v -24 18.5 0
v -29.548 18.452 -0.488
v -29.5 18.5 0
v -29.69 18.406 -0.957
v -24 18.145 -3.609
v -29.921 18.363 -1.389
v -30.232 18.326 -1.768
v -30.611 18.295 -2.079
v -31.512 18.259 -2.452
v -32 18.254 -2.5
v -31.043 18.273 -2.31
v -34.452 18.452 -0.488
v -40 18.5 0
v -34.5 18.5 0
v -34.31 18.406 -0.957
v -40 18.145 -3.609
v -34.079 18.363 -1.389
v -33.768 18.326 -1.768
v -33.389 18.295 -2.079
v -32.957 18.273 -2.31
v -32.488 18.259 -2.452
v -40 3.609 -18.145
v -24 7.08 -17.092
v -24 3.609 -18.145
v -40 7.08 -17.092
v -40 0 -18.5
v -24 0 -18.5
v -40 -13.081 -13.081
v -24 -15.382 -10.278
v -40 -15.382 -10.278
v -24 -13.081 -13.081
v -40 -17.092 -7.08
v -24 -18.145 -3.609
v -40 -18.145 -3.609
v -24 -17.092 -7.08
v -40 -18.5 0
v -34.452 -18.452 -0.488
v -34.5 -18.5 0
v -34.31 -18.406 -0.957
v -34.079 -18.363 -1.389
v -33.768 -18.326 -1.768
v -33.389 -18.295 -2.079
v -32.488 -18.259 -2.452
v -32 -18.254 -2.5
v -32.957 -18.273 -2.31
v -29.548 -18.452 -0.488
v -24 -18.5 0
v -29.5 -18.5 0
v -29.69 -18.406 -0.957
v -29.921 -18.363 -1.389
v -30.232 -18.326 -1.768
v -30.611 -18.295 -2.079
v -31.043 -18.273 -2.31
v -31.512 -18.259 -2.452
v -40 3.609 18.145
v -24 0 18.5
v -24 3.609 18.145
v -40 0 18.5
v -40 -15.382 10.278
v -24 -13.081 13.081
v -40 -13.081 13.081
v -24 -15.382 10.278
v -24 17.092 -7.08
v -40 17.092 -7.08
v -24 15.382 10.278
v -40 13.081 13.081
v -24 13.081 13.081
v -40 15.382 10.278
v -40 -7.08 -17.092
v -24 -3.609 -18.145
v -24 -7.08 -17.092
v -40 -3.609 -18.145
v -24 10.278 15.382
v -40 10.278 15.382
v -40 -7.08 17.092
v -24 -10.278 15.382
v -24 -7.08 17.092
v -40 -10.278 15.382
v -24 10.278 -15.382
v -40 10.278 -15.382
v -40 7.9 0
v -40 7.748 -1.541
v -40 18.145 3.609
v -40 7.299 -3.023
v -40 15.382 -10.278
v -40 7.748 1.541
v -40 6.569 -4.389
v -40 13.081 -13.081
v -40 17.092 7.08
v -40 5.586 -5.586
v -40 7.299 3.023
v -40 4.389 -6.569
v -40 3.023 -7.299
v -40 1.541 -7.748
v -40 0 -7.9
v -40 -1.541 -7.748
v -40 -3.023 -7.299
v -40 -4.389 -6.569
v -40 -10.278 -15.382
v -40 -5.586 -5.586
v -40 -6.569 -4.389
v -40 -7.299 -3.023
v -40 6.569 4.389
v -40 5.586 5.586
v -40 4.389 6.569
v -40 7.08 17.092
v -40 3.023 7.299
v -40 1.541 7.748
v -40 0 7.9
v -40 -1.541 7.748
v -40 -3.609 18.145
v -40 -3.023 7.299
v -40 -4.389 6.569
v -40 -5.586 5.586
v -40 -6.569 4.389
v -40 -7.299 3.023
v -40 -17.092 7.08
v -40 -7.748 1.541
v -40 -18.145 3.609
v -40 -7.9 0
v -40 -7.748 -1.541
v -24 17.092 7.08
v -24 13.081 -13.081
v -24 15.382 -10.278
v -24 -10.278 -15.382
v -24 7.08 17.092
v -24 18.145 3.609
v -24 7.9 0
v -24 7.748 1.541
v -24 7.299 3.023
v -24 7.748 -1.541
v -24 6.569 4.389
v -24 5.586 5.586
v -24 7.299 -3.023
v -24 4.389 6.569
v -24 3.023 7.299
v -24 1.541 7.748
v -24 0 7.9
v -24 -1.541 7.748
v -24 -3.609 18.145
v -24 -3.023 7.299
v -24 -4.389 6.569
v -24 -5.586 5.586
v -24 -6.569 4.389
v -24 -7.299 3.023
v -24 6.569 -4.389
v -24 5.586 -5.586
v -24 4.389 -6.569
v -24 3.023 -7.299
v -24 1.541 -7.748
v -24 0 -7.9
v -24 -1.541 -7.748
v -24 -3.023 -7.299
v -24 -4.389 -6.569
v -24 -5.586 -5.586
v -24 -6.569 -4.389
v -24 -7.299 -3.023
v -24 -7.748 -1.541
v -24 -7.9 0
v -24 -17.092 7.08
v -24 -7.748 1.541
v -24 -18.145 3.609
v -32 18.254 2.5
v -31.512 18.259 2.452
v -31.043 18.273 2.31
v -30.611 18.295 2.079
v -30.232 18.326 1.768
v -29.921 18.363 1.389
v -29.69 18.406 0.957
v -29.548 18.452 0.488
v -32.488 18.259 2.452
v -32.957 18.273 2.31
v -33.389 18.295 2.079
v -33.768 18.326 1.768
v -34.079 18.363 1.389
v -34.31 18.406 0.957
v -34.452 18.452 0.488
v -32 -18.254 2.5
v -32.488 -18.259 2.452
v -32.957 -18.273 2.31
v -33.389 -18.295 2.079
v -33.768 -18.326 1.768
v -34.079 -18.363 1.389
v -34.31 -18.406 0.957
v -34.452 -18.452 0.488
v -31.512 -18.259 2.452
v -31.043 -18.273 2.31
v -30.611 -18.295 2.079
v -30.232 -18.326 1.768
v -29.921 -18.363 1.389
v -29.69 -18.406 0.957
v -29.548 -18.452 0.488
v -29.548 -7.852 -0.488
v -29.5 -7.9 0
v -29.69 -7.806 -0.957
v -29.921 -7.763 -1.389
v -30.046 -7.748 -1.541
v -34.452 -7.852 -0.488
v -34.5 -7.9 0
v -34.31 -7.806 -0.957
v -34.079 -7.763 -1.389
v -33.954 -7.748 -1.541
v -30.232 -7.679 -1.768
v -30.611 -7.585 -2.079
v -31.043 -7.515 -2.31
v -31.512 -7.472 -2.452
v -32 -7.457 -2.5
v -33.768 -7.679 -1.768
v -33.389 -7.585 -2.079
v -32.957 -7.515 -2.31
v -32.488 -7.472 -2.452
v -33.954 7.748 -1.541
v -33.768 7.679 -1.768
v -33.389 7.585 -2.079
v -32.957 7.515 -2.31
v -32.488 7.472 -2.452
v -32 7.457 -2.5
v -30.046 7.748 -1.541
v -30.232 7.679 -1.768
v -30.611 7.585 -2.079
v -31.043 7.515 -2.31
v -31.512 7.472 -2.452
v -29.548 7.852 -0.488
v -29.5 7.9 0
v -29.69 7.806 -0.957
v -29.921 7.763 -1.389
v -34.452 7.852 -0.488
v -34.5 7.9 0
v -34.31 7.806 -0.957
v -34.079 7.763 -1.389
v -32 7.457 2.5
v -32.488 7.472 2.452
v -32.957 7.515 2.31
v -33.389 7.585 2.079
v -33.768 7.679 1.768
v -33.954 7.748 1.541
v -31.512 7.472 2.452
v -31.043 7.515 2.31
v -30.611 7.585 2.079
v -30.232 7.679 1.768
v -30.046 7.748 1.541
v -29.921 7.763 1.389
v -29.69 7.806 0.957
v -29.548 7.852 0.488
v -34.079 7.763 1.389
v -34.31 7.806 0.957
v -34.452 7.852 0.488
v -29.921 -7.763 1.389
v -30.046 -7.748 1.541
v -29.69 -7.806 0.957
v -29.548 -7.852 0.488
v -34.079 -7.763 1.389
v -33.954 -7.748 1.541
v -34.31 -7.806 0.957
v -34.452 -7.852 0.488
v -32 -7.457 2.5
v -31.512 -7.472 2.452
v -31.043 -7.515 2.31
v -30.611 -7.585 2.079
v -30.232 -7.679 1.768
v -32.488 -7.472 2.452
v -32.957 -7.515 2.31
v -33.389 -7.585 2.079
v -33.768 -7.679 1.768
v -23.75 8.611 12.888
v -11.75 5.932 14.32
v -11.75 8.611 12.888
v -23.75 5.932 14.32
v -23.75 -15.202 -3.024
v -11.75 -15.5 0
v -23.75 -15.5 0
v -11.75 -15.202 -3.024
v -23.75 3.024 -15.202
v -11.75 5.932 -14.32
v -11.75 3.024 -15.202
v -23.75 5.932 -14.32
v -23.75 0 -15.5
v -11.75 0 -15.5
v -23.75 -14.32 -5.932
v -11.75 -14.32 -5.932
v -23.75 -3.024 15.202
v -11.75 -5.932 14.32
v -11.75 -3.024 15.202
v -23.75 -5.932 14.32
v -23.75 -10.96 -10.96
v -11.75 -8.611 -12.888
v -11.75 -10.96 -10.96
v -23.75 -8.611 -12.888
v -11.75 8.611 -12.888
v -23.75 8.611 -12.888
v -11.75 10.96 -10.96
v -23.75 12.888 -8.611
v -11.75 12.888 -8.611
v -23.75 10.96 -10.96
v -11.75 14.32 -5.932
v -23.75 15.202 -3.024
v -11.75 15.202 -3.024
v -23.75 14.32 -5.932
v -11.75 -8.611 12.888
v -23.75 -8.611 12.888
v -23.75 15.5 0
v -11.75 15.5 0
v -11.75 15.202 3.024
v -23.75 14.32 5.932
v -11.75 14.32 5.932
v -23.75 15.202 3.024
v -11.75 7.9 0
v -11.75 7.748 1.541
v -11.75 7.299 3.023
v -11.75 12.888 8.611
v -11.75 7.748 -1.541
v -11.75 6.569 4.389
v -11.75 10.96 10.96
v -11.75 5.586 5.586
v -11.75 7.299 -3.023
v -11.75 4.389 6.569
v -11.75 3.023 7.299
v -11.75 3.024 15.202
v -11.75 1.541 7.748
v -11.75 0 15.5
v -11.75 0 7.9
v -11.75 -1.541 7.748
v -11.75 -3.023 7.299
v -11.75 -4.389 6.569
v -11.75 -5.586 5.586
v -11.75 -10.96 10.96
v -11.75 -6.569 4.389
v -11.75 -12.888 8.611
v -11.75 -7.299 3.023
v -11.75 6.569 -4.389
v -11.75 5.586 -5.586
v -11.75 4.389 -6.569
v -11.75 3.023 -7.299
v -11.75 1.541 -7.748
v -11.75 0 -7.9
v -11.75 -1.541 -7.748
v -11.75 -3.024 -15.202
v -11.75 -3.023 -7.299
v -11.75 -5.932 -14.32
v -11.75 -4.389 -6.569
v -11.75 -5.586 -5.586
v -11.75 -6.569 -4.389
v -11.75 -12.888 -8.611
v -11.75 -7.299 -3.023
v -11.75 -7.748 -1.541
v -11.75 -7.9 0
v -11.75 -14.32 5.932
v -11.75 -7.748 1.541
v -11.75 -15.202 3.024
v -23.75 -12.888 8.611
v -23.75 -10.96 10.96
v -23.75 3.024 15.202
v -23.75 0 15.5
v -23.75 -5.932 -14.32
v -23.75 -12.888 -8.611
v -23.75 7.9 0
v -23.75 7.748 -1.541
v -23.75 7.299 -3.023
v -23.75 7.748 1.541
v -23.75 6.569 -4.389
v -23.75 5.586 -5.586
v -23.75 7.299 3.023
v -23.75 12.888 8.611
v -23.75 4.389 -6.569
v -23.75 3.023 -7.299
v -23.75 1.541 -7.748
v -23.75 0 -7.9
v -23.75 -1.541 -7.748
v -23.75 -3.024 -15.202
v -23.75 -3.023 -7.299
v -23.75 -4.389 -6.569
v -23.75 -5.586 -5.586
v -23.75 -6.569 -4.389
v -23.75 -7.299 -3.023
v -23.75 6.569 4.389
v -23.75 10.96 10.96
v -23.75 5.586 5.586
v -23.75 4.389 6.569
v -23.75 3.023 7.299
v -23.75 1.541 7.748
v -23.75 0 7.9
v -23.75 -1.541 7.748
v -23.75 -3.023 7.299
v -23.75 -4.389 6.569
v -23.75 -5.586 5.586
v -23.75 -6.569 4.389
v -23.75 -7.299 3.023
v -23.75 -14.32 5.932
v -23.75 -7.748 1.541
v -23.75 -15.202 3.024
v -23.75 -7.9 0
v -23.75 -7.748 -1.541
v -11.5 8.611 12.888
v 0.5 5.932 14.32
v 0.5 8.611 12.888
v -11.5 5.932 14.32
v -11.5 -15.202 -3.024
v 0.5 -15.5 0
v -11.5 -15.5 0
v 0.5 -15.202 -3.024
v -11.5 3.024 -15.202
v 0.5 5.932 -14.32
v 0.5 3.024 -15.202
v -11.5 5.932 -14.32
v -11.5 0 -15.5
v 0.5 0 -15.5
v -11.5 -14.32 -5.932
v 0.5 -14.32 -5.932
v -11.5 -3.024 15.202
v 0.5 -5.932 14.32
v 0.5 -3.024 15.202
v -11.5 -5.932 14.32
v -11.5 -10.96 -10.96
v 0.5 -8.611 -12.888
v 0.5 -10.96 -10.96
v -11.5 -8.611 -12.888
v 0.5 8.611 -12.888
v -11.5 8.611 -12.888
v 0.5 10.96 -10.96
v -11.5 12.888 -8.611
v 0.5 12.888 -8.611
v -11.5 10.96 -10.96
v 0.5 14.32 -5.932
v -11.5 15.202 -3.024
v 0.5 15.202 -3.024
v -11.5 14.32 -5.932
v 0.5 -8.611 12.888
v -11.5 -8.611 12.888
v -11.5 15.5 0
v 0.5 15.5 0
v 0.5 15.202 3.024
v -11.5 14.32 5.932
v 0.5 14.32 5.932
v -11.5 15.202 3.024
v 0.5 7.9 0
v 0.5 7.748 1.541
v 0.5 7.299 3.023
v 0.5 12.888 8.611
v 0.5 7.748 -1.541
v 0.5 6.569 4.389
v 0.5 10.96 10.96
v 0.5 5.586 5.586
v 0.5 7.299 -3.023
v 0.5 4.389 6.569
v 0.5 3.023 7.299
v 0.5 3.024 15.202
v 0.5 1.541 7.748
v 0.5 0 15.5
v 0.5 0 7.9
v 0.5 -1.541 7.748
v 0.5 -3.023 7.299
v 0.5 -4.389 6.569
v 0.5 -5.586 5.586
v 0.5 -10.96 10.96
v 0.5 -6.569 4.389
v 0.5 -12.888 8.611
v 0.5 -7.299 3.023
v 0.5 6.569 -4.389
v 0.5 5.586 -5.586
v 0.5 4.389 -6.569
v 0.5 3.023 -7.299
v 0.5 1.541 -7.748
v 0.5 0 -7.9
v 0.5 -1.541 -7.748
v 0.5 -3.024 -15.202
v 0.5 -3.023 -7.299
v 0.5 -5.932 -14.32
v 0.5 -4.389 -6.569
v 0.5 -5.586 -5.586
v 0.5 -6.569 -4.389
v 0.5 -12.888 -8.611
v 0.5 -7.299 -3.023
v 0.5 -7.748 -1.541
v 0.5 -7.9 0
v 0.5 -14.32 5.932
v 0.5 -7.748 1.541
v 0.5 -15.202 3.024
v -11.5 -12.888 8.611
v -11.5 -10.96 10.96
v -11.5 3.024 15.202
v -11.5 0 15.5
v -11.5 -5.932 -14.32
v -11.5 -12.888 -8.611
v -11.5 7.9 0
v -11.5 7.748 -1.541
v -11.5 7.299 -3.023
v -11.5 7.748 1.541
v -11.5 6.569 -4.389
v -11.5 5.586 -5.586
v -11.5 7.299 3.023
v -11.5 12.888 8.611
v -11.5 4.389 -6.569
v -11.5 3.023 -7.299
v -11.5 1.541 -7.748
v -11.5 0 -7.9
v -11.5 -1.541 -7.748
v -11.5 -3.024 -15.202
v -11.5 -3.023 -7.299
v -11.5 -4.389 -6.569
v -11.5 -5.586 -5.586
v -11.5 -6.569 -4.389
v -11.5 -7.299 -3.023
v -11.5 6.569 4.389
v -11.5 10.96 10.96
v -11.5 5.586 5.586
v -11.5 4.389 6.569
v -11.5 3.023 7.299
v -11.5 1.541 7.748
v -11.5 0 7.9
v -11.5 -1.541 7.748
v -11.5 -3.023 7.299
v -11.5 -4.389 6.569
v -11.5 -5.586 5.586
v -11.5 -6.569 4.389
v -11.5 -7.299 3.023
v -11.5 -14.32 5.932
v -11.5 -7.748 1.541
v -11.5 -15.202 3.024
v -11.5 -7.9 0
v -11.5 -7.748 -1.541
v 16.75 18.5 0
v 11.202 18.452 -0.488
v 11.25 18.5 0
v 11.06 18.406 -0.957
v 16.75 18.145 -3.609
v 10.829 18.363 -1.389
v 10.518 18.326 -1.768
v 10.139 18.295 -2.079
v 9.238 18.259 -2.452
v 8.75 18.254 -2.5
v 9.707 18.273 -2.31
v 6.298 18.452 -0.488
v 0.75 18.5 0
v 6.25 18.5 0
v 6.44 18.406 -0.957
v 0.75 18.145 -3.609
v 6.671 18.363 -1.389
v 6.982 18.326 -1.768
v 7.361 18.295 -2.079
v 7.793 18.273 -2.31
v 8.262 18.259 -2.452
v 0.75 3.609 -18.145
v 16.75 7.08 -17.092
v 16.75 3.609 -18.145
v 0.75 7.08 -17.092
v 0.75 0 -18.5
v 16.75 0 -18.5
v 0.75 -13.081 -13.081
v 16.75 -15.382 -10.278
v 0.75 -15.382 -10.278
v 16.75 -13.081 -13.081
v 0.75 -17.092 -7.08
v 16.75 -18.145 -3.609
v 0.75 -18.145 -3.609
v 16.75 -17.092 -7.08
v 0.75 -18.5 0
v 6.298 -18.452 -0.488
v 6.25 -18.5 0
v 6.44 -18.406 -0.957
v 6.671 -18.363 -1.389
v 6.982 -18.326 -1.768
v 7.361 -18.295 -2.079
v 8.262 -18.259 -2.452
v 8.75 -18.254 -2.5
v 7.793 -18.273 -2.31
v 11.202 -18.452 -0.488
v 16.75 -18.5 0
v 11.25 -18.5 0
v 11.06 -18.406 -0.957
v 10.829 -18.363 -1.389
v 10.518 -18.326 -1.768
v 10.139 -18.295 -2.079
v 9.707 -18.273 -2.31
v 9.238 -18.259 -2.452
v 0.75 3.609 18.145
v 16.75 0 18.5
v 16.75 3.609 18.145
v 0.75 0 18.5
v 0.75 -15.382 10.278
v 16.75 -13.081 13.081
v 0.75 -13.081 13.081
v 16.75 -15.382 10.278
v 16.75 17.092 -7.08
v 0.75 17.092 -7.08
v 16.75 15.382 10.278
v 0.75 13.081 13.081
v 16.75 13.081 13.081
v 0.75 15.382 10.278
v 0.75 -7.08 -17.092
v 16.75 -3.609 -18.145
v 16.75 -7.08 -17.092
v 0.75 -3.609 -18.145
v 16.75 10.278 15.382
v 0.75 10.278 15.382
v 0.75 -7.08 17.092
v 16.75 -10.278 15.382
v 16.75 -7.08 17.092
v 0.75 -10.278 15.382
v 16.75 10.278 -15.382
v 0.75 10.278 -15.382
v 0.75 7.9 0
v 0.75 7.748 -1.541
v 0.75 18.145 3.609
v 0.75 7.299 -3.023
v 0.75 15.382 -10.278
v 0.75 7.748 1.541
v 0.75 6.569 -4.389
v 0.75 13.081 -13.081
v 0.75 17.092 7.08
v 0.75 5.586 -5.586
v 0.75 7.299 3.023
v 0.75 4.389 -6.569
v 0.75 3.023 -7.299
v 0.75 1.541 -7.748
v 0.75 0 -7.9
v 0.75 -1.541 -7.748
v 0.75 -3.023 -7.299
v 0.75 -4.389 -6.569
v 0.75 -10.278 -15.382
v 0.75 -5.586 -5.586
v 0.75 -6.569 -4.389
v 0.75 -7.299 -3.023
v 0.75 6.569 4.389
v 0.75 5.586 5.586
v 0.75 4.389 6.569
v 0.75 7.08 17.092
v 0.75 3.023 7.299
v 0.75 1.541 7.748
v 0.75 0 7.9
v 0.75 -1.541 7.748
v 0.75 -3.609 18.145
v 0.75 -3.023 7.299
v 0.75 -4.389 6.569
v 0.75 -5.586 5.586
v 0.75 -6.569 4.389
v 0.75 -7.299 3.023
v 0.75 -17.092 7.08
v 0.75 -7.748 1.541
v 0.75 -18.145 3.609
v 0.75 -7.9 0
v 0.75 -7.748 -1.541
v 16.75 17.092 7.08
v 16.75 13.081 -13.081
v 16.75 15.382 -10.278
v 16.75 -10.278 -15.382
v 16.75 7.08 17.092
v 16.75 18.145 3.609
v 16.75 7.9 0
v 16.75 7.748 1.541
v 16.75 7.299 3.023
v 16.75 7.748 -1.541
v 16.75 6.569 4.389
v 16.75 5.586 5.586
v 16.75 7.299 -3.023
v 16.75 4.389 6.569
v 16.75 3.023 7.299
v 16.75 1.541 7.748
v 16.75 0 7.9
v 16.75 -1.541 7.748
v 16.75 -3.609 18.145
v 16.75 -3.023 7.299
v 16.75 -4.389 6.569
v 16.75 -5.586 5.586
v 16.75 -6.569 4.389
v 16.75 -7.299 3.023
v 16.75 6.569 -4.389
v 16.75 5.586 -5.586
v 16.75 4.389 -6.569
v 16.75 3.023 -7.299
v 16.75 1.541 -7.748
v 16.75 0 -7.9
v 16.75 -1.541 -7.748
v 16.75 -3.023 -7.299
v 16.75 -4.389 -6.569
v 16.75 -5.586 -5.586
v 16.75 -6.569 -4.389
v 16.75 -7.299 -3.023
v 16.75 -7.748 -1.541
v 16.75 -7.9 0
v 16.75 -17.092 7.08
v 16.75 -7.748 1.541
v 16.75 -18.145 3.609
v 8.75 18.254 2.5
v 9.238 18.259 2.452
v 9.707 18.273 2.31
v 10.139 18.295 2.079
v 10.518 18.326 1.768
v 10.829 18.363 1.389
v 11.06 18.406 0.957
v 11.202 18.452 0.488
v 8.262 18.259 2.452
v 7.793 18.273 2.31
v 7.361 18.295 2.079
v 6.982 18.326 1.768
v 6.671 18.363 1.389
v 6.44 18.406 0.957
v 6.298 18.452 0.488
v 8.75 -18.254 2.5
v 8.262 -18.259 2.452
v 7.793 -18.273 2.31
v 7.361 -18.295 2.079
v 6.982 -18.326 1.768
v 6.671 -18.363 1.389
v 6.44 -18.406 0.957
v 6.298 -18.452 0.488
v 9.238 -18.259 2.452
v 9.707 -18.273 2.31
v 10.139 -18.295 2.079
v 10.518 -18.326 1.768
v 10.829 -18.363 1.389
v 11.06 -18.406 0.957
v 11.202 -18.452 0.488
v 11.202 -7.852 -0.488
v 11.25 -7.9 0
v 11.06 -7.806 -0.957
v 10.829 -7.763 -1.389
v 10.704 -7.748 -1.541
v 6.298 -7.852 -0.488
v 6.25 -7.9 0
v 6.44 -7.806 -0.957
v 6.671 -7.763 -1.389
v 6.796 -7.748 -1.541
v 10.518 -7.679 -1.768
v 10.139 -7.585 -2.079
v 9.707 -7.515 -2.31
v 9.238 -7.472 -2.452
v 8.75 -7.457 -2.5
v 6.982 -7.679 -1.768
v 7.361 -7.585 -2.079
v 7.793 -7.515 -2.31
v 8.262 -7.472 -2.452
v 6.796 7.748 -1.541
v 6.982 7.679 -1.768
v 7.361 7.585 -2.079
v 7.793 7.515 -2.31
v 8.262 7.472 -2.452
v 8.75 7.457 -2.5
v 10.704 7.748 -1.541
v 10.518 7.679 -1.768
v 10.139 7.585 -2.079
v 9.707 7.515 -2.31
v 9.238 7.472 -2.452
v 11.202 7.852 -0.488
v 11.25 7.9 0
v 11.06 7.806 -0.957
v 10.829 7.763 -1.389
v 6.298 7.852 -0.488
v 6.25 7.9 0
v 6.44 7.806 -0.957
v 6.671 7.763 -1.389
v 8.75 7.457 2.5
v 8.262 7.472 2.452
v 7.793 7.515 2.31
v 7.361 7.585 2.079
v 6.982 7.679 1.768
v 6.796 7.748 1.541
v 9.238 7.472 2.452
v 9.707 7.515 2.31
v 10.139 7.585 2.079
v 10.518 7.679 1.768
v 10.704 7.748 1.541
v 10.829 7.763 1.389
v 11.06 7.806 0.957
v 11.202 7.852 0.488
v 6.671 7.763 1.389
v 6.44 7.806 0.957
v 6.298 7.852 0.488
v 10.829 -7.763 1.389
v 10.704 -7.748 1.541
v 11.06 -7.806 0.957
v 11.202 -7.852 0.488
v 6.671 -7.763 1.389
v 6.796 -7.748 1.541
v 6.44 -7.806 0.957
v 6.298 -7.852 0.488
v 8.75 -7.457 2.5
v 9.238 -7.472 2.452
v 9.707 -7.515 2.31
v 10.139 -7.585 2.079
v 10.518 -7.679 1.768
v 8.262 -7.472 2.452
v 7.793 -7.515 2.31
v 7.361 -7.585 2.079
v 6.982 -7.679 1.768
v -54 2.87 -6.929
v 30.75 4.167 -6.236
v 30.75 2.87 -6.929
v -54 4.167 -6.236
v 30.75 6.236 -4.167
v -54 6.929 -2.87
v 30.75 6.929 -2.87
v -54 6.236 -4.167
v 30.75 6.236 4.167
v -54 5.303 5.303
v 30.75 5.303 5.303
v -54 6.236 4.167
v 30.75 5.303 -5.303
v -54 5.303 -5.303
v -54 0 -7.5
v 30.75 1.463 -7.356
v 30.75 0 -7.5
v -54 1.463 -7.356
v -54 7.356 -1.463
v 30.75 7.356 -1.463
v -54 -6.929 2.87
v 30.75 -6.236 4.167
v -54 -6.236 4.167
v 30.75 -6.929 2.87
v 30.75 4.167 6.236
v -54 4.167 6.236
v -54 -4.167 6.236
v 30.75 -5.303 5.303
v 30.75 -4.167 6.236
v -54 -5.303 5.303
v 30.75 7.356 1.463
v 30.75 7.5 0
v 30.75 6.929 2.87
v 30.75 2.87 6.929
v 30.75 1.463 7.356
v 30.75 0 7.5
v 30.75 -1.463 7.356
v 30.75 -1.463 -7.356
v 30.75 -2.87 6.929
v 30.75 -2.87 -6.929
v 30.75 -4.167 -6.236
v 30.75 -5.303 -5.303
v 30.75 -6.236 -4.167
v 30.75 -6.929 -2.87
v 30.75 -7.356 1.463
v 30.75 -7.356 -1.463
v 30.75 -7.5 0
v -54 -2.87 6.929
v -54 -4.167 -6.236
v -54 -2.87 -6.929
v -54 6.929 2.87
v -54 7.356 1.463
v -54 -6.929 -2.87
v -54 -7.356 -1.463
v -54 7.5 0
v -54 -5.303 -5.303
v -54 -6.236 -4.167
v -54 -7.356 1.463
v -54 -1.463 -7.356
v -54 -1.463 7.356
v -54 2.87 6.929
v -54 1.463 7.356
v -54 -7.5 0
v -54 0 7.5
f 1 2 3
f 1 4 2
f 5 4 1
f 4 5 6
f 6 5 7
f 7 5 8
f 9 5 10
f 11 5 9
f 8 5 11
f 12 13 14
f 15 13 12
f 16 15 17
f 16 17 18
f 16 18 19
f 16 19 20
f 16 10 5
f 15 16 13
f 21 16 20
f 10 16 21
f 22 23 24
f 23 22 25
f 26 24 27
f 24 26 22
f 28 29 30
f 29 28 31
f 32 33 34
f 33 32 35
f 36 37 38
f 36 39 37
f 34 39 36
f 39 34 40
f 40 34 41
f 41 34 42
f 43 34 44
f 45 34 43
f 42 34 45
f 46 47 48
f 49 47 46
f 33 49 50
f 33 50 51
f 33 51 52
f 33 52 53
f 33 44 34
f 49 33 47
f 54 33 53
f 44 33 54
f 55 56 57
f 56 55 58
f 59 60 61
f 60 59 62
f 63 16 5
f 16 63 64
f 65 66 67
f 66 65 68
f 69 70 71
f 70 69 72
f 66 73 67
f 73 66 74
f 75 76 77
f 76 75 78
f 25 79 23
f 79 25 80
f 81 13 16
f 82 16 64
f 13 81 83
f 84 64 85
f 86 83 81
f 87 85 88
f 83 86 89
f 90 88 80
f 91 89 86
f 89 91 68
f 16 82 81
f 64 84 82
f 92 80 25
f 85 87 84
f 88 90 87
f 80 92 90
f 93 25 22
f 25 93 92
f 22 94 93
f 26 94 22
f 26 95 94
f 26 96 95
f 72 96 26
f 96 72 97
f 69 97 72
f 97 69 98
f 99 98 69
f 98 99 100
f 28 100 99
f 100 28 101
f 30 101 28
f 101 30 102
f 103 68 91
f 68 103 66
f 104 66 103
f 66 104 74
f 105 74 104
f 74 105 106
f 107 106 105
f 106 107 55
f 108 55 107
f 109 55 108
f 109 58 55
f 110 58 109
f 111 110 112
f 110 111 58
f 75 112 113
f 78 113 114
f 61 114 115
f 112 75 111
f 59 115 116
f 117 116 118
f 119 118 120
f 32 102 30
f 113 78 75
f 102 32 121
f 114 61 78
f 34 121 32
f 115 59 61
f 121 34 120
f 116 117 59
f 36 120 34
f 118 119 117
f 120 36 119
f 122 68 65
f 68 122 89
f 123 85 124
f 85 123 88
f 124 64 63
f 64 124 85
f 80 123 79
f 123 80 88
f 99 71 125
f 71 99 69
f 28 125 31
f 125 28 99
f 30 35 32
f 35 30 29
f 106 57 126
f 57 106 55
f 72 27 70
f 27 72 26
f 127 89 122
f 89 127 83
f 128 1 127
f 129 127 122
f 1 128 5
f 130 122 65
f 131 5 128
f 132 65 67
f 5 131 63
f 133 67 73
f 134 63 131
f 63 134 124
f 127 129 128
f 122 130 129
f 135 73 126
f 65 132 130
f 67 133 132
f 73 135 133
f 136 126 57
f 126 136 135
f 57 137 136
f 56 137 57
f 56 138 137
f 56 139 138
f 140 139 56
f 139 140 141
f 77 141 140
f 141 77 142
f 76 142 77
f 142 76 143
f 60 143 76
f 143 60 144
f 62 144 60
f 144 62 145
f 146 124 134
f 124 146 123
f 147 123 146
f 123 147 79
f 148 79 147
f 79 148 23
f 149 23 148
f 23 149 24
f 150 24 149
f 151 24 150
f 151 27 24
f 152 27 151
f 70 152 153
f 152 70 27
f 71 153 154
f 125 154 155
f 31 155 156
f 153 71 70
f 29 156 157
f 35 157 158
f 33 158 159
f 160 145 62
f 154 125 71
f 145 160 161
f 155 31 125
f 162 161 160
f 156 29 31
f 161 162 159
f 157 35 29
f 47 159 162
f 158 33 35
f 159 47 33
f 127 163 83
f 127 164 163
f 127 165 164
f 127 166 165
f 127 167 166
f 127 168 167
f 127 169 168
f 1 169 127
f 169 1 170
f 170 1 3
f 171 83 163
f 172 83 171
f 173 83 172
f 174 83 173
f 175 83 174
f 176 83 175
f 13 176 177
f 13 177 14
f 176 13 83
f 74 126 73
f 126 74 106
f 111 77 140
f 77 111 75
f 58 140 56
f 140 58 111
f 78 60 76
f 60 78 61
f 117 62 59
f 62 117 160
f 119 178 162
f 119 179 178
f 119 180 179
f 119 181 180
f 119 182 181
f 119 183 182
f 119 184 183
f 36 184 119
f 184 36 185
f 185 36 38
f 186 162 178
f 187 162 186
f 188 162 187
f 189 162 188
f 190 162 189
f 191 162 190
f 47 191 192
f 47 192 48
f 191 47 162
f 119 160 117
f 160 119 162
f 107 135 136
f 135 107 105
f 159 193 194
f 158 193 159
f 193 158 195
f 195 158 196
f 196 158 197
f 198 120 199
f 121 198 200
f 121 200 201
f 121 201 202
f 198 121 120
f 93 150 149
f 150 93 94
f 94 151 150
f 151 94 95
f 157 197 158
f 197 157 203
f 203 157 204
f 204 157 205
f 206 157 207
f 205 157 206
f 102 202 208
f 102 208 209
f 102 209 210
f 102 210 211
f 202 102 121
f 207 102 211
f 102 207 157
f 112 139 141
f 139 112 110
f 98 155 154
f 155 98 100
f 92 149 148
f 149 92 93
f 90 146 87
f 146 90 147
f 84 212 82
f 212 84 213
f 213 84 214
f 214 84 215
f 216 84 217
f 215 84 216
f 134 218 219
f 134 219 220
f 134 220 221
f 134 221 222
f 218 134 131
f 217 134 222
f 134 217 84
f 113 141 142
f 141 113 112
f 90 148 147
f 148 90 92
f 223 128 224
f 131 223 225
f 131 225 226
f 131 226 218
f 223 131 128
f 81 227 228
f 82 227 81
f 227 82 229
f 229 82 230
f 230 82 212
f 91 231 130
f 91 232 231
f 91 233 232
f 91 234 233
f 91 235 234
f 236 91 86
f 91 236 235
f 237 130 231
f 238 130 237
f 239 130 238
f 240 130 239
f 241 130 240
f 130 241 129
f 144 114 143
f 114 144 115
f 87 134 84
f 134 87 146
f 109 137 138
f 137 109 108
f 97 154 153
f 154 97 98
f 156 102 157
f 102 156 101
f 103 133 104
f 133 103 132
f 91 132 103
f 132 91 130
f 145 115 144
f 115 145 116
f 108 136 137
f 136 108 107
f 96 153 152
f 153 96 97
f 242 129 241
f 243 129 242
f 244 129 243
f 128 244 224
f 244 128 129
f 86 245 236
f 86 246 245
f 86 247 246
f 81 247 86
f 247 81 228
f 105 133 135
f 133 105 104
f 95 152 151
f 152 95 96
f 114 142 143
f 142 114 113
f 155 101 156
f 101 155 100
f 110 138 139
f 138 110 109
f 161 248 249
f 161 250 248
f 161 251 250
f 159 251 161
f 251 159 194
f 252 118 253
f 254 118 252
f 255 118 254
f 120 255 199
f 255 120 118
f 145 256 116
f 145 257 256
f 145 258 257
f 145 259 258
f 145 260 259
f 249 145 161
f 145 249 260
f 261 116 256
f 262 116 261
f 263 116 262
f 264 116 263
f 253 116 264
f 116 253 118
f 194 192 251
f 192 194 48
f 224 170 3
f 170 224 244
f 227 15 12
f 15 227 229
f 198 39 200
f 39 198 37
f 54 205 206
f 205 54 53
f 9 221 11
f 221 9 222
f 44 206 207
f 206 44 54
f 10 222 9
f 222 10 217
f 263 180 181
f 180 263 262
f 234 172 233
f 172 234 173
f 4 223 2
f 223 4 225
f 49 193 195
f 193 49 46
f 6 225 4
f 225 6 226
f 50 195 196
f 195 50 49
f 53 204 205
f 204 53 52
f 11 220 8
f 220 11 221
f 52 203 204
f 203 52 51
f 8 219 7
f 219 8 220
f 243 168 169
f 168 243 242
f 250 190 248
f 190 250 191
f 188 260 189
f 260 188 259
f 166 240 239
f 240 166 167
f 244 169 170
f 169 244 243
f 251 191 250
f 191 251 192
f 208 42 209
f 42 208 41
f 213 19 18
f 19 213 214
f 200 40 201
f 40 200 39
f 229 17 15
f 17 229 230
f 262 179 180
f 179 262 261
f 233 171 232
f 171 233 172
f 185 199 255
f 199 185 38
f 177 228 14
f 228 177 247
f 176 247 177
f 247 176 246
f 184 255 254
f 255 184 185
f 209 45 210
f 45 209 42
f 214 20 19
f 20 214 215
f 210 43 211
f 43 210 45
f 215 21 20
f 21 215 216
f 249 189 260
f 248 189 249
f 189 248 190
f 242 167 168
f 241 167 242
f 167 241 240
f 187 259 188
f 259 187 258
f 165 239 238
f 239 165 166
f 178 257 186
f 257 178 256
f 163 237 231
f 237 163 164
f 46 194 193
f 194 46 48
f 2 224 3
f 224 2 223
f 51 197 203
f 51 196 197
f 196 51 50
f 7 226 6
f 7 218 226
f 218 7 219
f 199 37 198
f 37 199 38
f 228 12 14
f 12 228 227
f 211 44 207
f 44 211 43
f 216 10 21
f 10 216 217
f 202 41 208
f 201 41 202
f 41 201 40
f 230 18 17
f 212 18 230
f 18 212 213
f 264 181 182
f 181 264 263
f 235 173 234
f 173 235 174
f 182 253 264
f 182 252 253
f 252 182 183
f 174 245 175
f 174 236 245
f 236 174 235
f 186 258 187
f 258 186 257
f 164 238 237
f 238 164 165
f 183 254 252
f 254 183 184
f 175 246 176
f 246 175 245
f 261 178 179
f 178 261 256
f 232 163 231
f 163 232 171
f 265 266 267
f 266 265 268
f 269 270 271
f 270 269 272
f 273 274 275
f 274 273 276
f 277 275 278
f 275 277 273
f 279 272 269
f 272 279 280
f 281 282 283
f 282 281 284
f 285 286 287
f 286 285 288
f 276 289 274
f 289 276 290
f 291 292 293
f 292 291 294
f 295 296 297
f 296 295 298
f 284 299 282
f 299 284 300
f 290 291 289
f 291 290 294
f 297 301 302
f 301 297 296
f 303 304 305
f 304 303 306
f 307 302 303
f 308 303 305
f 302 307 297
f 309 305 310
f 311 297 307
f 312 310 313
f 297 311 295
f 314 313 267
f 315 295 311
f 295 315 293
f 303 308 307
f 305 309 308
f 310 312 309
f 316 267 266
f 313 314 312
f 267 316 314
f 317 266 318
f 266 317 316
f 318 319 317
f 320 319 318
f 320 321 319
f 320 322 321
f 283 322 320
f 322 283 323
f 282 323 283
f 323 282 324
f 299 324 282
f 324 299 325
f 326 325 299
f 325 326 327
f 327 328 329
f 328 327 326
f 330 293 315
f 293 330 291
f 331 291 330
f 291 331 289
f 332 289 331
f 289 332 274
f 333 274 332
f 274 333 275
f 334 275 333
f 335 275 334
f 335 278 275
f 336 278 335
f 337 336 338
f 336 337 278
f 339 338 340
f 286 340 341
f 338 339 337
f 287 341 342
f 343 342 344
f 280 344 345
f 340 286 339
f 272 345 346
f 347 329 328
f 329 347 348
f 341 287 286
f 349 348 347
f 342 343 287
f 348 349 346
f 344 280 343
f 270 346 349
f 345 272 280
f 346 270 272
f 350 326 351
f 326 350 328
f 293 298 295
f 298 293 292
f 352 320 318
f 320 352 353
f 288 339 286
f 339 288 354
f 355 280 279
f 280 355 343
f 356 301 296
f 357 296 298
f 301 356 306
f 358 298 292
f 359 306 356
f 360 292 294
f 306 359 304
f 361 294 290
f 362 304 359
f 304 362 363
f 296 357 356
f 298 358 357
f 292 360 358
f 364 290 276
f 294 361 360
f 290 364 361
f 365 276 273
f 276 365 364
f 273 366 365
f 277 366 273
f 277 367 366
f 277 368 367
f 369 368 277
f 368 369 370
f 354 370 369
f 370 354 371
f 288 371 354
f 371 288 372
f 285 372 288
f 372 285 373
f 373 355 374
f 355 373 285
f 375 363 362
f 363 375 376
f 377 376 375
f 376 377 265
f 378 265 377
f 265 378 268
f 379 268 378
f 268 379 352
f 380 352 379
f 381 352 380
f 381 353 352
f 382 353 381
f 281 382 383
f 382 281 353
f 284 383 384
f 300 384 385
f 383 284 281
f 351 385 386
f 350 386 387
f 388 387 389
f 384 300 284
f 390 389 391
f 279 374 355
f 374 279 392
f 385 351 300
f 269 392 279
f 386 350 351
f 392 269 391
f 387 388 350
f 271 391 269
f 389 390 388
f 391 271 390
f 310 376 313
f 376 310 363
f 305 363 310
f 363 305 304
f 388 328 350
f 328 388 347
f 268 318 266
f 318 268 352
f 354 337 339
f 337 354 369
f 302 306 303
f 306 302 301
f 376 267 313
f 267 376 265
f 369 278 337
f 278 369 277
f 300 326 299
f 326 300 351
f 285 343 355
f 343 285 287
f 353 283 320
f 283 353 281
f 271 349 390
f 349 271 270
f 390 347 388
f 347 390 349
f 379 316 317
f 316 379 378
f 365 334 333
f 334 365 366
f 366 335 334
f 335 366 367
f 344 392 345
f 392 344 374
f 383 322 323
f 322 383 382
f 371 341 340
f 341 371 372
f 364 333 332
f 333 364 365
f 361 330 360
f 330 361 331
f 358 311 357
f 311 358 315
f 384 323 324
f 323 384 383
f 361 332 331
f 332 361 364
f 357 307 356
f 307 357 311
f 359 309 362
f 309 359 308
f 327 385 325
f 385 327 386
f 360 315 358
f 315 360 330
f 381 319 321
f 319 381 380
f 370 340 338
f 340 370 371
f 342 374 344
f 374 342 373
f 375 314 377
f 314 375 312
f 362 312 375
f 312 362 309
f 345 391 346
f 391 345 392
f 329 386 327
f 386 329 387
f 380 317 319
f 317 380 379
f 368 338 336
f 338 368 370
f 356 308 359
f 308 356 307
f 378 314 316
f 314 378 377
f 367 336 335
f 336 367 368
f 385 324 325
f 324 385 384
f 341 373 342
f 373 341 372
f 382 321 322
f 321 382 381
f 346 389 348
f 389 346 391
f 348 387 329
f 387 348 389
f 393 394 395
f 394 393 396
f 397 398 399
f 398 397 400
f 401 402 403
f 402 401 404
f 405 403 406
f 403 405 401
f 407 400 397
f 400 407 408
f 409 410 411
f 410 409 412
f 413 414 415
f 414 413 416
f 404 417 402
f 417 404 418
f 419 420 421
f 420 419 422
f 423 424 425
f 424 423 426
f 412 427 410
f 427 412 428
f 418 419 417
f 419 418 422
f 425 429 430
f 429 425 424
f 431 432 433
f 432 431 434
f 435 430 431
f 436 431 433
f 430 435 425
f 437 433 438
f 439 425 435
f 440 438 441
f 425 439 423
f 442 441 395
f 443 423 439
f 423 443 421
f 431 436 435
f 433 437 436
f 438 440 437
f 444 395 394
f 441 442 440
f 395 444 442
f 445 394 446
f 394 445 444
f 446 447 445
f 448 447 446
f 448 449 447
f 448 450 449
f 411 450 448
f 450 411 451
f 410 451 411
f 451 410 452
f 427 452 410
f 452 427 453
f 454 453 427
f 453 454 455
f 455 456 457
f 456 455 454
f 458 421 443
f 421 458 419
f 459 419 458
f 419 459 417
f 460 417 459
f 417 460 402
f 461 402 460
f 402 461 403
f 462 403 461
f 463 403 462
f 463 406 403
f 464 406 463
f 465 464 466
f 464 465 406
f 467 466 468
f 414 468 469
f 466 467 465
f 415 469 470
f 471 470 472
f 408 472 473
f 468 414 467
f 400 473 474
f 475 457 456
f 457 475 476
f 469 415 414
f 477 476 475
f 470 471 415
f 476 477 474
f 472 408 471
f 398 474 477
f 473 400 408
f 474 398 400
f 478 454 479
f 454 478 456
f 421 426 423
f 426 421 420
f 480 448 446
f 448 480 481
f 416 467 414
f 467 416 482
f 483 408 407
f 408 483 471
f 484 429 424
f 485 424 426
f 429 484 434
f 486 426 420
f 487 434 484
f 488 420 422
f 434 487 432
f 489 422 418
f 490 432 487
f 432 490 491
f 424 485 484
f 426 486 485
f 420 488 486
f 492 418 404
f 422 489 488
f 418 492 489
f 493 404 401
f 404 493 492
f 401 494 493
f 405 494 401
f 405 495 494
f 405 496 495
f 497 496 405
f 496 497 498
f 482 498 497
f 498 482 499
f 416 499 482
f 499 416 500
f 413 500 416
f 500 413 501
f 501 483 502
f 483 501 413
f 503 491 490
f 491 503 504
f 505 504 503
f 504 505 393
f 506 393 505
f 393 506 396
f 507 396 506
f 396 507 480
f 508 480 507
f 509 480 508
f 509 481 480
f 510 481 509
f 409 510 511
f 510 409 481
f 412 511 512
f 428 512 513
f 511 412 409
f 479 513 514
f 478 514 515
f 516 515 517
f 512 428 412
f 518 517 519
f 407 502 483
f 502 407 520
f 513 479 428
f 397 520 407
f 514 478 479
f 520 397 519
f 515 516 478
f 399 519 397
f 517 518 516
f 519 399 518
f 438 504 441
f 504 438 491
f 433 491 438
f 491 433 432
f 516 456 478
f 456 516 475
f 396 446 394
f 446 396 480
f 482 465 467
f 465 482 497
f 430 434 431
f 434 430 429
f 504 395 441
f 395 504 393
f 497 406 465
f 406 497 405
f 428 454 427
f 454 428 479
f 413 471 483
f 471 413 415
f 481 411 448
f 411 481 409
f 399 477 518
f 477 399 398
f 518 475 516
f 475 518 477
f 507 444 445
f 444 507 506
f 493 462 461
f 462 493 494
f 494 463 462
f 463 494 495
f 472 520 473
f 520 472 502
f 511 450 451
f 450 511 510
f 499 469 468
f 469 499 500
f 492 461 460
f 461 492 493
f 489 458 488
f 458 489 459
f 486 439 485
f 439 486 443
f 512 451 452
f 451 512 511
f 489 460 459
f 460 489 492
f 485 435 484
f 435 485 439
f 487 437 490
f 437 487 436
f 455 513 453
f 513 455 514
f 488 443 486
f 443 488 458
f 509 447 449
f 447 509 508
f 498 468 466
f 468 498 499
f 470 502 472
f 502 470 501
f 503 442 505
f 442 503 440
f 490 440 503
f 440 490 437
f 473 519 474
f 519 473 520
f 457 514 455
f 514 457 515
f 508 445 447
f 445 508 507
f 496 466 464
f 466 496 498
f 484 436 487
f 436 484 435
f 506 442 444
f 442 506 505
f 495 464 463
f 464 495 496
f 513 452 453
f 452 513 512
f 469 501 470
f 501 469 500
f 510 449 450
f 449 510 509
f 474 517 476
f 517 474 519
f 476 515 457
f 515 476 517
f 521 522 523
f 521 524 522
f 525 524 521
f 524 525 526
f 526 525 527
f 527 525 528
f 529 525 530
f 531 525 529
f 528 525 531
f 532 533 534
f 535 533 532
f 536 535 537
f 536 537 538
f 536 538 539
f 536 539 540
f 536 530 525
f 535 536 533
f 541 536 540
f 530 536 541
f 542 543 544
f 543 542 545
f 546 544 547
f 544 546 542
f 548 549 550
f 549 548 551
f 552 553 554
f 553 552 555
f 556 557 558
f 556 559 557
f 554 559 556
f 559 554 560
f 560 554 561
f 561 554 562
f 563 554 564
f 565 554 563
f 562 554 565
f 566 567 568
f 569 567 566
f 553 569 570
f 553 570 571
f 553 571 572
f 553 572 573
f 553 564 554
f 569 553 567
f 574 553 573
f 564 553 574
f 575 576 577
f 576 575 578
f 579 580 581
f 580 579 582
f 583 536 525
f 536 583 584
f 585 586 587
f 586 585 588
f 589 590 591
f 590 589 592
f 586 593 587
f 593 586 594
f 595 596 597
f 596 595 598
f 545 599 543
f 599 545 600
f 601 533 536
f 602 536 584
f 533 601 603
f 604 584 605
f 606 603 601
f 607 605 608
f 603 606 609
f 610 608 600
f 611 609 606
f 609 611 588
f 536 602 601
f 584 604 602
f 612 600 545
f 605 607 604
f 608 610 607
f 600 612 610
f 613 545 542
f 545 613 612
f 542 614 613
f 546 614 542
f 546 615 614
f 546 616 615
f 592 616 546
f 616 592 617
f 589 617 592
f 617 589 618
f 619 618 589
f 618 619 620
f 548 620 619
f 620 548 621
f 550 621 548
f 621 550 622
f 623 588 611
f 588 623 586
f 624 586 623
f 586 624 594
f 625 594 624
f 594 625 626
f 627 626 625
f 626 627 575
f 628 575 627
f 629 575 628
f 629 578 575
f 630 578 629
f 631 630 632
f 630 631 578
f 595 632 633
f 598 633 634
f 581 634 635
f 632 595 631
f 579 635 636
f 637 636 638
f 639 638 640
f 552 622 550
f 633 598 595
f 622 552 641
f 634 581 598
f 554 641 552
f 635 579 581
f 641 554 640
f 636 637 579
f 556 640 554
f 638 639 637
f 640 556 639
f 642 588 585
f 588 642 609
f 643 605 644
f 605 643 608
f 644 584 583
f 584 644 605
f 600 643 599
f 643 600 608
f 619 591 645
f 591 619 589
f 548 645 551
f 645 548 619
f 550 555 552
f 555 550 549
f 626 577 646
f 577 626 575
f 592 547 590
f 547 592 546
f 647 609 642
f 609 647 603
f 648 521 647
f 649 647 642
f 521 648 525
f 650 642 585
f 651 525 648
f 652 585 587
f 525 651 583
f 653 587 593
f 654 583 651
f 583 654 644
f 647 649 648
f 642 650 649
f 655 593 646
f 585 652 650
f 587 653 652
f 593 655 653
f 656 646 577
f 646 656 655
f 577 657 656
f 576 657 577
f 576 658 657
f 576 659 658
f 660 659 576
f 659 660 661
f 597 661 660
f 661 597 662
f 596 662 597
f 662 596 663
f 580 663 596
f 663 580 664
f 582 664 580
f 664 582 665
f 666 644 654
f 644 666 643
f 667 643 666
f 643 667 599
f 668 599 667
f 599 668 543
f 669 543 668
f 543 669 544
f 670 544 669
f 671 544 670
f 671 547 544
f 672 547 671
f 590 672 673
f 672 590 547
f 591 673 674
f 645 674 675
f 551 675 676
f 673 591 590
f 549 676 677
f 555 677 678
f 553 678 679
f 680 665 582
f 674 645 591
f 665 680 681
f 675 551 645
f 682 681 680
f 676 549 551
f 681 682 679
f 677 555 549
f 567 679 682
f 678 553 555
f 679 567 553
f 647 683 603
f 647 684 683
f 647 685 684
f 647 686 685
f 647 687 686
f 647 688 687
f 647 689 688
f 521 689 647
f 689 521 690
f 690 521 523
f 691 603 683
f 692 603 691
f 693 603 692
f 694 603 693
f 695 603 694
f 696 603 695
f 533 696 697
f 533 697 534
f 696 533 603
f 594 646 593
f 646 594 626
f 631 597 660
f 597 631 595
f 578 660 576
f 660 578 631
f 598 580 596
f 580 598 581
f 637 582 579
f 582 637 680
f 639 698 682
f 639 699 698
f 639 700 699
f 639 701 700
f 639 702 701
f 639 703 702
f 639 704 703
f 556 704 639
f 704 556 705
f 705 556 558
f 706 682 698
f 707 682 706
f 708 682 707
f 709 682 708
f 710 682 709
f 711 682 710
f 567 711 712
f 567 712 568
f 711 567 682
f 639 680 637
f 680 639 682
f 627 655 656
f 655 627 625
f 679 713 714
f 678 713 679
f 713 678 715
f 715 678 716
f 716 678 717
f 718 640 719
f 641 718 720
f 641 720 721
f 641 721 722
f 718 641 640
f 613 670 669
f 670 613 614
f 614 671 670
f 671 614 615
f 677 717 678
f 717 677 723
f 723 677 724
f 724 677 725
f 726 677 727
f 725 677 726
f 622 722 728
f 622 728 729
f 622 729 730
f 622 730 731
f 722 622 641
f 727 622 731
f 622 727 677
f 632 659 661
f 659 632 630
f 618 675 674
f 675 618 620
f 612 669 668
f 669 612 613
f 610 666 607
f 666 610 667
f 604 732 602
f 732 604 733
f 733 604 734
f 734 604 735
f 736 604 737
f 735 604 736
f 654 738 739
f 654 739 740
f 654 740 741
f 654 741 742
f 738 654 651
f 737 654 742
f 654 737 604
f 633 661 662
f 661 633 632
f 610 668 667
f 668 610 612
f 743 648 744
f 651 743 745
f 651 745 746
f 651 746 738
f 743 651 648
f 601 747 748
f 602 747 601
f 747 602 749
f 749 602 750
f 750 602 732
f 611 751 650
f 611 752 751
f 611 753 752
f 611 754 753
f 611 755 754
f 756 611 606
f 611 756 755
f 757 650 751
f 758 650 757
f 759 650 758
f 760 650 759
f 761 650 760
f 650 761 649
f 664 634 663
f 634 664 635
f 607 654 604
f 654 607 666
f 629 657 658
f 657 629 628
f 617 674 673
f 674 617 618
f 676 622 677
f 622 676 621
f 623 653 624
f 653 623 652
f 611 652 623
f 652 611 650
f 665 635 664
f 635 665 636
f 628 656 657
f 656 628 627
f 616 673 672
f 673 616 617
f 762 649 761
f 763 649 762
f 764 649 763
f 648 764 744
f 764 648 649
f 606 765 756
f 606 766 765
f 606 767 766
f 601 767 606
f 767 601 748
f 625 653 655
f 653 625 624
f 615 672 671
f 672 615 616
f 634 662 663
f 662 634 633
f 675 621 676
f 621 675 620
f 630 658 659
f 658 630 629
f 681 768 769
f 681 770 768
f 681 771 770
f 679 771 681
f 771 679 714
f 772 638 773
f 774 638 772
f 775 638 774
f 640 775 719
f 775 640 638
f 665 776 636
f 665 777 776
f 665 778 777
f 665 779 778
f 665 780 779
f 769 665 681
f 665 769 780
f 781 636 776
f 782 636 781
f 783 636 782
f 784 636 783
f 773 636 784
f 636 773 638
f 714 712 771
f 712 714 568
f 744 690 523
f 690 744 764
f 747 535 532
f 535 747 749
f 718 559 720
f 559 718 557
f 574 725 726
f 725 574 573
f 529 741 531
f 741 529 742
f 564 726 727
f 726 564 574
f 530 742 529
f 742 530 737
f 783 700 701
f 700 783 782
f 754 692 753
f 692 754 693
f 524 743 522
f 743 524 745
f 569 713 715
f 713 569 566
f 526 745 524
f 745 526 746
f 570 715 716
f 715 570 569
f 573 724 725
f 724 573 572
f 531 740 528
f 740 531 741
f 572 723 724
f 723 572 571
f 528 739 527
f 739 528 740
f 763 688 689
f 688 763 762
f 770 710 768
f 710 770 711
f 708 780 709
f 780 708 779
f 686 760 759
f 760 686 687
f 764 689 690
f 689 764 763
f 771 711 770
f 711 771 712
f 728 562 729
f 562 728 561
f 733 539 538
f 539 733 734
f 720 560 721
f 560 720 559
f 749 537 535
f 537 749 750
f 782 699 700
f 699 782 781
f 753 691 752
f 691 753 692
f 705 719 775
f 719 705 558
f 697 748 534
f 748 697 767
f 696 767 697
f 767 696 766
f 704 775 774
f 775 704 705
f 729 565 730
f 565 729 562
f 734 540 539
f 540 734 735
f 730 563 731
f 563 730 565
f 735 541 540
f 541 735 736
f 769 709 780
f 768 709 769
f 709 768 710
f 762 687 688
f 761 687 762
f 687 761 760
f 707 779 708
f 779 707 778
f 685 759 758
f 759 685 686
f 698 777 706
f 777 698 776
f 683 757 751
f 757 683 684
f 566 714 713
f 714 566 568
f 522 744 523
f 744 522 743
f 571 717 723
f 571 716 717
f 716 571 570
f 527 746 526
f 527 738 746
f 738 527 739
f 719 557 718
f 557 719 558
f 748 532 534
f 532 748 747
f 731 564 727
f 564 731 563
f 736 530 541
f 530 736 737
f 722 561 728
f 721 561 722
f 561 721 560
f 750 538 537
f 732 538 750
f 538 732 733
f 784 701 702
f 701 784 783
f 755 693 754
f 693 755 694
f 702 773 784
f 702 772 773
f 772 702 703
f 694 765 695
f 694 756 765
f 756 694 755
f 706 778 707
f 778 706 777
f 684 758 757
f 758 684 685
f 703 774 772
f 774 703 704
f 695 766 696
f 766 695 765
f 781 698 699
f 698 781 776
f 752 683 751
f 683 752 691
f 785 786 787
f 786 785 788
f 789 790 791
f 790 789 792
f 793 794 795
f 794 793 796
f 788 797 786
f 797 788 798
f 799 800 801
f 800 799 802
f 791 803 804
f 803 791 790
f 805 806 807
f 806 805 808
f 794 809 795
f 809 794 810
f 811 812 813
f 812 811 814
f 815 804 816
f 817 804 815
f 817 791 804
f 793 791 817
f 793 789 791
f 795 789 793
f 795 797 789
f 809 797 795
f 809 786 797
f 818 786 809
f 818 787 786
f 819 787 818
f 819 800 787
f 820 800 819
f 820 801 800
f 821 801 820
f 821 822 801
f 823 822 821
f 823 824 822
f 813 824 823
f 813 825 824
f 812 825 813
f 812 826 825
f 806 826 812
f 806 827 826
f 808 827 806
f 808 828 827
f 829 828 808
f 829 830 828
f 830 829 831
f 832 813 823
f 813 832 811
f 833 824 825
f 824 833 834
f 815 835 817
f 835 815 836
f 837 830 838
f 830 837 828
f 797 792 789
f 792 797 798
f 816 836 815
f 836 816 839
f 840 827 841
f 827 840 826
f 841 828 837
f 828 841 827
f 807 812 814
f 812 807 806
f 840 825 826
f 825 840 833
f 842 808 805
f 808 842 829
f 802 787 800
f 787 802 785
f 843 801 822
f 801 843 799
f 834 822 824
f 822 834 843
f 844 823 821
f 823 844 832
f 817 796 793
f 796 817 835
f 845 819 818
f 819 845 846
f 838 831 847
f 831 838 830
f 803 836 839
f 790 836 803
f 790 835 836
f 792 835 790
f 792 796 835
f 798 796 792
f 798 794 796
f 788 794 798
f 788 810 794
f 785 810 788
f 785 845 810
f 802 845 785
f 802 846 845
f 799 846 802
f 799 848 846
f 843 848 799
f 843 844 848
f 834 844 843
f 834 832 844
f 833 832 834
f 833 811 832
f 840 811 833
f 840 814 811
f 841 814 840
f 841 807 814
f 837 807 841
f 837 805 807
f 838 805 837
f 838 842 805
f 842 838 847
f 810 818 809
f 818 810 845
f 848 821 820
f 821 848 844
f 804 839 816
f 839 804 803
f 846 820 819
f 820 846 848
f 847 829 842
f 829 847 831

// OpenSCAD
$fn = 32;

// ------------------------------------------------------------------------
// Shaft with rings and collars: d15 shaft, 4 rings
// Every part is its own module, assembly() places them once.
// ------------------------------------------------------------------------

// --- part 1 ---
module shaft() {
  translate([0, 0, -42.375]) cylinder(h = 84.75, d = 15);
}

// --- part 2 ---
module collar_a() {
  difference() {
    cylinder(h = 16, d = 37);
    translate([0, 0, -1]) cylinder(h = 18, d = 15.8);
    translate([0, 0, 8]) rotate([90, 0, 0]) cylinder(h = 39, d = 5, center = true);
  }
}

// --- part 3 ---
module spacer_a() {
  difference() {
      translate([0, 0, 0]) cylinder(h = 12, d = 31);
      translate([0, 0, -1]) cylinder(h = 14, d = 15.8);
    }
}

// --- part 4 ---
module spacer_b() {
  difference() {
      translate([0, 0, 0]) cylinder(h = 12, d = 31);
      translate([0, 0, -1]) cylinder(h = 14, d = 15.8);
    }
}

// --- part 5 ---
module collar_b() {
  difference() {
    cylinder(h = 16, d = 37);
    translate([0, 0, -1]) cylinder(h = 18, d = 15.8);
    translate([0, 0, 8]) rotate([90, 0, 0]) cylinder(h = 39, d = 5, center = true);
  }
}

// --- assembly ---
module assembly() {
  translate([-11.625, 0, 0]) rotate([0, 90, 0]) shaft();
  translate([-40, 0, 0]) rotate([0, 90, 0]) collar_a();
  translate([-23.75, 0, 0]) rotate([0, 90, 0]) spacer_a();
  translate([-11.5, 0, 0]) rotate([0, 90, 0]) spacer_b();
  translate([0.75, 0, 0]) rotate([0, 90, 0]) collar_b();
}

assembly();
